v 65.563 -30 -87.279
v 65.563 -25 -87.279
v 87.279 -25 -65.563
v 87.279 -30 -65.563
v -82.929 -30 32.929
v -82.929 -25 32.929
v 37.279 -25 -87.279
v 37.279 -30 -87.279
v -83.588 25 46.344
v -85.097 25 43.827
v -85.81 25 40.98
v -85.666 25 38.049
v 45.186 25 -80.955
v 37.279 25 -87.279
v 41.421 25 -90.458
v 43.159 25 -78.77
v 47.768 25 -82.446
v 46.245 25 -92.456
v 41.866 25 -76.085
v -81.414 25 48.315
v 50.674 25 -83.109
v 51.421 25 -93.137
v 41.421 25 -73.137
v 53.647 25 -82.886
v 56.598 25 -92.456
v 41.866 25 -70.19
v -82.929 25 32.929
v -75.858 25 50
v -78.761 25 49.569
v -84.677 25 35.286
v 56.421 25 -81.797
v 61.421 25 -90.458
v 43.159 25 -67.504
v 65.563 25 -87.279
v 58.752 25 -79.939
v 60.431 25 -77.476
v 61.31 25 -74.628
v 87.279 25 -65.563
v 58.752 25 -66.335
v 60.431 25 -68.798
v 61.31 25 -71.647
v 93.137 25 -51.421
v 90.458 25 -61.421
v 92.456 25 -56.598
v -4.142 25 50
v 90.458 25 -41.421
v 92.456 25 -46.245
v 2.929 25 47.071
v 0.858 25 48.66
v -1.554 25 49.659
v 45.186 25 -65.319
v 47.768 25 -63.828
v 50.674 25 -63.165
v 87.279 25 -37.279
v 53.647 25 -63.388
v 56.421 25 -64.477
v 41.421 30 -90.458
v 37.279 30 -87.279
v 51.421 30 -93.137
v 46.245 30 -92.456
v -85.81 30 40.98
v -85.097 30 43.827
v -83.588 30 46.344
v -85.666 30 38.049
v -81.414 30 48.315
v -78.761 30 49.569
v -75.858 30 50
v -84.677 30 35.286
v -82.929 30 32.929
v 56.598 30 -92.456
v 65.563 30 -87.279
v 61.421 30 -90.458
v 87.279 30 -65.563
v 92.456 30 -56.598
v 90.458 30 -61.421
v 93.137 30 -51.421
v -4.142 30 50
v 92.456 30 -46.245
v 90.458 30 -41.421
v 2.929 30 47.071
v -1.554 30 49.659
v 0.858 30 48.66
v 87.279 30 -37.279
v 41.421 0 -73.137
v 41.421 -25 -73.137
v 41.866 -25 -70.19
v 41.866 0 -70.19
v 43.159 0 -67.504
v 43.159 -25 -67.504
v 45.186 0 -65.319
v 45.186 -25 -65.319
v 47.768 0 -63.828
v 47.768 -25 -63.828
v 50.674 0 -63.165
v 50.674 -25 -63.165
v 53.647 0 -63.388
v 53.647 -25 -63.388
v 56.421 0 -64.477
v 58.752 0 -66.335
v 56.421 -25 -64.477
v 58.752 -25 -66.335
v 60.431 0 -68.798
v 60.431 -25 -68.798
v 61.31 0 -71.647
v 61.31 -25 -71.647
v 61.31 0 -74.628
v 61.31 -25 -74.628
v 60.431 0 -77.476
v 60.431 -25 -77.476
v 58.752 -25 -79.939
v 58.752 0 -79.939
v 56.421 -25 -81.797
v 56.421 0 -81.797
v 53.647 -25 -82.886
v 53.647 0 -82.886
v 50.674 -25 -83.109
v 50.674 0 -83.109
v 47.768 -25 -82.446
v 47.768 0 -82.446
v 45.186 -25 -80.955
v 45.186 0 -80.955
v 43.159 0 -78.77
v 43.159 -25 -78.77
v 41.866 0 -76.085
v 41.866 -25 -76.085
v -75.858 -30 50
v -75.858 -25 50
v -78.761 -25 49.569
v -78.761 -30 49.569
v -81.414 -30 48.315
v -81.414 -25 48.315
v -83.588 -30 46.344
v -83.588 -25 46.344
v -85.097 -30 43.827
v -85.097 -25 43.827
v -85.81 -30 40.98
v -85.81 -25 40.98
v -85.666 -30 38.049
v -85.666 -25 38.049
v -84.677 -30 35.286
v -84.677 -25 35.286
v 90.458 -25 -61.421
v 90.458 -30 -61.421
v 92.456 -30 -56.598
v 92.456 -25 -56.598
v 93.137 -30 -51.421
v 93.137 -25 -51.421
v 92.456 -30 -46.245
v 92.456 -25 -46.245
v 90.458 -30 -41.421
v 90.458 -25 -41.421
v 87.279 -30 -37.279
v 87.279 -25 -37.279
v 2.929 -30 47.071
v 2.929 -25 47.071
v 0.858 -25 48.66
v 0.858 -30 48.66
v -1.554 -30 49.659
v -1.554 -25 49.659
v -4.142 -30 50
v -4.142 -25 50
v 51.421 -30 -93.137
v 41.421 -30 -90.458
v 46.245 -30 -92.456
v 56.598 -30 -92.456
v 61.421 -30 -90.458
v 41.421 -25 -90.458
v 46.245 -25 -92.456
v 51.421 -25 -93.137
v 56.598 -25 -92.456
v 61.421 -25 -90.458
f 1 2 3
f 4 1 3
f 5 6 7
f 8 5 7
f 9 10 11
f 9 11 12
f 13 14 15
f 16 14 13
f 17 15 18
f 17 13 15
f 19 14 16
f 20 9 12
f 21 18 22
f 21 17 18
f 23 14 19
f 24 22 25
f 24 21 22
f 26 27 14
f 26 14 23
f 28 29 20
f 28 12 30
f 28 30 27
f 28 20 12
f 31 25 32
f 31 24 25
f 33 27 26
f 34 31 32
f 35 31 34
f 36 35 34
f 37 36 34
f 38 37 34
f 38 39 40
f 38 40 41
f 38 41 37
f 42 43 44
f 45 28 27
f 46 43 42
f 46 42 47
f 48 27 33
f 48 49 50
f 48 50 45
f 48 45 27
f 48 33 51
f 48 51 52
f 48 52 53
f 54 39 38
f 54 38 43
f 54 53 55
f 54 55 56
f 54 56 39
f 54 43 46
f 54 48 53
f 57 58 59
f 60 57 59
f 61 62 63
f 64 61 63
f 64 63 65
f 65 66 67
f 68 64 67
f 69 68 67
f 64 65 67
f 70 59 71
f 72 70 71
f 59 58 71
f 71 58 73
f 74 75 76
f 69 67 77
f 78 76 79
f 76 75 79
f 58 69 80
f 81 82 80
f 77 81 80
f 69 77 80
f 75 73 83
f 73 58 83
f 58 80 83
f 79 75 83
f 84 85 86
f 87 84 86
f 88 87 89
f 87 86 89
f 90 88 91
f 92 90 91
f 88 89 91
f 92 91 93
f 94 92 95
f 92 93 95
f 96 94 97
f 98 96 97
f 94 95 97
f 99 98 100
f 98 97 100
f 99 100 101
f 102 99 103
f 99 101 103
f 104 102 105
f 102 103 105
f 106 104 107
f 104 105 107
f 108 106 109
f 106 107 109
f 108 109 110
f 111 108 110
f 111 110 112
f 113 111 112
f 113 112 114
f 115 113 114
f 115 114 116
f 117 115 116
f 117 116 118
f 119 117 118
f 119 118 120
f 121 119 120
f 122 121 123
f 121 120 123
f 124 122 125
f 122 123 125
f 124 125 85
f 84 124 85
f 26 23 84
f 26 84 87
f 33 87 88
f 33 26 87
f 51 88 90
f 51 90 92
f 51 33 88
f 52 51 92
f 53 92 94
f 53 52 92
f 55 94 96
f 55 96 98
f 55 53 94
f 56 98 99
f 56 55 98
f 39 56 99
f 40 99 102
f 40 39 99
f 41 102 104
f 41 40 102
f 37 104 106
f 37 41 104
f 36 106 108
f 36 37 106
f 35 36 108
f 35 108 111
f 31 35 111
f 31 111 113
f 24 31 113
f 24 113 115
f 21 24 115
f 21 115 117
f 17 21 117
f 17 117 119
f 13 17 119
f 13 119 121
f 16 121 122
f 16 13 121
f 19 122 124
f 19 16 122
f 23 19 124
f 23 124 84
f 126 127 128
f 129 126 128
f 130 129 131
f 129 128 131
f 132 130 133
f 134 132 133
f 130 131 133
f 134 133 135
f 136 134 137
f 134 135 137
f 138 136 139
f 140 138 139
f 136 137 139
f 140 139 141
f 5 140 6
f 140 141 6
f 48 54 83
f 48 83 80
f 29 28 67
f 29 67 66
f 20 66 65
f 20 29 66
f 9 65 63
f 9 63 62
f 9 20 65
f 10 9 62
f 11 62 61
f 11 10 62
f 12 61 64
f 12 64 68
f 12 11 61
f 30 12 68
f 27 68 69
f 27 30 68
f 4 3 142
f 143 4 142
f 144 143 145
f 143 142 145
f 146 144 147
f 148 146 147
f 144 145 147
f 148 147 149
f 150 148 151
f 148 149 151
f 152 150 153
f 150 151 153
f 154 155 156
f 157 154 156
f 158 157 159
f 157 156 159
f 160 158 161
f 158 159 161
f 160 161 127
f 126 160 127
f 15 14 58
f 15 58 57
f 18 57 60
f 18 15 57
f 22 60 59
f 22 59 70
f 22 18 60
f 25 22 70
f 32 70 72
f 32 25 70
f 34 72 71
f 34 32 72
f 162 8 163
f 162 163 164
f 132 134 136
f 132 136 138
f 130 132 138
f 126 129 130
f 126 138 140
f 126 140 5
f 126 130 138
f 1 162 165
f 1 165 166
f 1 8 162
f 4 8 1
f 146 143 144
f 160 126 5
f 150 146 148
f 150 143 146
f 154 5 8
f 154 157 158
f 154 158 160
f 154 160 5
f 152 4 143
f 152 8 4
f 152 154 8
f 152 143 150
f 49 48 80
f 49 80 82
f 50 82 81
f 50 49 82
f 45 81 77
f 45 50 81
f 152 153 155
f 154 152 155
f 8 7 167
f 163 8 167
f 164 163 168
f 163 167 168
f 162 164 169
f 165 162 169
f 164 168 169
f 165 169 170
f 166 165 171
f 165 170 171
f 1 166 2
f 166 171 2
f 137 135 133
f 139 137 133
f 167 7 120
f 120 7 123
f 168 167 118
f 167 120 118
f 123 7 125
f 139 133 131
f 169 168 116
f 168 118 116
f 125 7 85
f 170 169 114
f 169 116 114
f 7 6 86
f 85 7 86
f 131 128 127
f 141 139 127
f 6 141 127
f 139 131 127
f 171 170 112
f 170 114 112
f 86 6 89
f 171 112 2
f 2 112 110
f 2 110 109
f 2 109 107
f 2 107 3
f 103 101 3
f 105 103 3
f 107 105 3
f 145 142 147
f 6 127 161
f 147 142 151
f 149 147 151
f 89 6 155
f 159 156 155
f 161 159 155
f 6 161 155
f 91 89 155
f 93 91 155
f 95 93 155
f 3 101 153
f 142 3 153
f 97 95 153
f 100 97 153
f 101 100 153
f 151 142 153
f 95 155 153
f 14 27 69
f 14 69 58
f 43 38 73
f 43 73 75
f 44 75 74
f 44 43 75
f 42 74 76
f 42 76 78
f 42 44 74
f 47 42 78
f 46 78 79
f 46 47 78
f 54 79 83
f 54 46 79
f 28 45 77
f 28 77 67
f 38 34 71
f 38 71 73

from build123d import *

# Parameters (mm, degrees)
F2_DEPTH = 5
F3_R     = 10
F4_DEPTH = 25


with BuildPart() as f2:
    # F1 (on offset) → F2 (new body)
    with BuildSketch(Plane.XZ.offset(25)):
        with BuildLine():
            Line((-4.142136, 50), (-75.857864, 50))
            ThreePointArc((-75.857864, 50), (-85.09666, 43.826834), (-82.928932, 32.928932))
            Line((-82.928932, 32.928932), (37.279221, -87.279221))
            ThreePointArc((37.279221, -87.279221), (51.421356, -93.137085), (65.563492, -87.279221))
            Line((65.563492, -87.279221), (87.279221, -65.563492))
            ThreePointArc((87.279221, -65.563492), (93.137085, -51.421356), (87.279221, -37.279221))
            Line((87.279221, -37.279221), (2.928932, 47.071068))
            ThreePointArc((2.928932, 47.071068), (-0.315301, 49.238795), (-4.142136, 50))
        make_face()
    extrude(amount=F2_DEPTH)

    # F3 (on face) → F4 (join)
    with BuildSketch(Plane(origin=(0, -25, 0), x_dir=(-1, 0, 0), z_dir=(0, 1, 0))):
        with Locations((-51.421356, -73.137085)):
            Circle(F3_R)
    extrude(amount=F4_DEPTH)

    # F5: F2 across plane


with BuildPart() as f2_1:
    add(f2.part)
    add(f2.part.mirror(Plane.XZ))


solid = f2_1.part
